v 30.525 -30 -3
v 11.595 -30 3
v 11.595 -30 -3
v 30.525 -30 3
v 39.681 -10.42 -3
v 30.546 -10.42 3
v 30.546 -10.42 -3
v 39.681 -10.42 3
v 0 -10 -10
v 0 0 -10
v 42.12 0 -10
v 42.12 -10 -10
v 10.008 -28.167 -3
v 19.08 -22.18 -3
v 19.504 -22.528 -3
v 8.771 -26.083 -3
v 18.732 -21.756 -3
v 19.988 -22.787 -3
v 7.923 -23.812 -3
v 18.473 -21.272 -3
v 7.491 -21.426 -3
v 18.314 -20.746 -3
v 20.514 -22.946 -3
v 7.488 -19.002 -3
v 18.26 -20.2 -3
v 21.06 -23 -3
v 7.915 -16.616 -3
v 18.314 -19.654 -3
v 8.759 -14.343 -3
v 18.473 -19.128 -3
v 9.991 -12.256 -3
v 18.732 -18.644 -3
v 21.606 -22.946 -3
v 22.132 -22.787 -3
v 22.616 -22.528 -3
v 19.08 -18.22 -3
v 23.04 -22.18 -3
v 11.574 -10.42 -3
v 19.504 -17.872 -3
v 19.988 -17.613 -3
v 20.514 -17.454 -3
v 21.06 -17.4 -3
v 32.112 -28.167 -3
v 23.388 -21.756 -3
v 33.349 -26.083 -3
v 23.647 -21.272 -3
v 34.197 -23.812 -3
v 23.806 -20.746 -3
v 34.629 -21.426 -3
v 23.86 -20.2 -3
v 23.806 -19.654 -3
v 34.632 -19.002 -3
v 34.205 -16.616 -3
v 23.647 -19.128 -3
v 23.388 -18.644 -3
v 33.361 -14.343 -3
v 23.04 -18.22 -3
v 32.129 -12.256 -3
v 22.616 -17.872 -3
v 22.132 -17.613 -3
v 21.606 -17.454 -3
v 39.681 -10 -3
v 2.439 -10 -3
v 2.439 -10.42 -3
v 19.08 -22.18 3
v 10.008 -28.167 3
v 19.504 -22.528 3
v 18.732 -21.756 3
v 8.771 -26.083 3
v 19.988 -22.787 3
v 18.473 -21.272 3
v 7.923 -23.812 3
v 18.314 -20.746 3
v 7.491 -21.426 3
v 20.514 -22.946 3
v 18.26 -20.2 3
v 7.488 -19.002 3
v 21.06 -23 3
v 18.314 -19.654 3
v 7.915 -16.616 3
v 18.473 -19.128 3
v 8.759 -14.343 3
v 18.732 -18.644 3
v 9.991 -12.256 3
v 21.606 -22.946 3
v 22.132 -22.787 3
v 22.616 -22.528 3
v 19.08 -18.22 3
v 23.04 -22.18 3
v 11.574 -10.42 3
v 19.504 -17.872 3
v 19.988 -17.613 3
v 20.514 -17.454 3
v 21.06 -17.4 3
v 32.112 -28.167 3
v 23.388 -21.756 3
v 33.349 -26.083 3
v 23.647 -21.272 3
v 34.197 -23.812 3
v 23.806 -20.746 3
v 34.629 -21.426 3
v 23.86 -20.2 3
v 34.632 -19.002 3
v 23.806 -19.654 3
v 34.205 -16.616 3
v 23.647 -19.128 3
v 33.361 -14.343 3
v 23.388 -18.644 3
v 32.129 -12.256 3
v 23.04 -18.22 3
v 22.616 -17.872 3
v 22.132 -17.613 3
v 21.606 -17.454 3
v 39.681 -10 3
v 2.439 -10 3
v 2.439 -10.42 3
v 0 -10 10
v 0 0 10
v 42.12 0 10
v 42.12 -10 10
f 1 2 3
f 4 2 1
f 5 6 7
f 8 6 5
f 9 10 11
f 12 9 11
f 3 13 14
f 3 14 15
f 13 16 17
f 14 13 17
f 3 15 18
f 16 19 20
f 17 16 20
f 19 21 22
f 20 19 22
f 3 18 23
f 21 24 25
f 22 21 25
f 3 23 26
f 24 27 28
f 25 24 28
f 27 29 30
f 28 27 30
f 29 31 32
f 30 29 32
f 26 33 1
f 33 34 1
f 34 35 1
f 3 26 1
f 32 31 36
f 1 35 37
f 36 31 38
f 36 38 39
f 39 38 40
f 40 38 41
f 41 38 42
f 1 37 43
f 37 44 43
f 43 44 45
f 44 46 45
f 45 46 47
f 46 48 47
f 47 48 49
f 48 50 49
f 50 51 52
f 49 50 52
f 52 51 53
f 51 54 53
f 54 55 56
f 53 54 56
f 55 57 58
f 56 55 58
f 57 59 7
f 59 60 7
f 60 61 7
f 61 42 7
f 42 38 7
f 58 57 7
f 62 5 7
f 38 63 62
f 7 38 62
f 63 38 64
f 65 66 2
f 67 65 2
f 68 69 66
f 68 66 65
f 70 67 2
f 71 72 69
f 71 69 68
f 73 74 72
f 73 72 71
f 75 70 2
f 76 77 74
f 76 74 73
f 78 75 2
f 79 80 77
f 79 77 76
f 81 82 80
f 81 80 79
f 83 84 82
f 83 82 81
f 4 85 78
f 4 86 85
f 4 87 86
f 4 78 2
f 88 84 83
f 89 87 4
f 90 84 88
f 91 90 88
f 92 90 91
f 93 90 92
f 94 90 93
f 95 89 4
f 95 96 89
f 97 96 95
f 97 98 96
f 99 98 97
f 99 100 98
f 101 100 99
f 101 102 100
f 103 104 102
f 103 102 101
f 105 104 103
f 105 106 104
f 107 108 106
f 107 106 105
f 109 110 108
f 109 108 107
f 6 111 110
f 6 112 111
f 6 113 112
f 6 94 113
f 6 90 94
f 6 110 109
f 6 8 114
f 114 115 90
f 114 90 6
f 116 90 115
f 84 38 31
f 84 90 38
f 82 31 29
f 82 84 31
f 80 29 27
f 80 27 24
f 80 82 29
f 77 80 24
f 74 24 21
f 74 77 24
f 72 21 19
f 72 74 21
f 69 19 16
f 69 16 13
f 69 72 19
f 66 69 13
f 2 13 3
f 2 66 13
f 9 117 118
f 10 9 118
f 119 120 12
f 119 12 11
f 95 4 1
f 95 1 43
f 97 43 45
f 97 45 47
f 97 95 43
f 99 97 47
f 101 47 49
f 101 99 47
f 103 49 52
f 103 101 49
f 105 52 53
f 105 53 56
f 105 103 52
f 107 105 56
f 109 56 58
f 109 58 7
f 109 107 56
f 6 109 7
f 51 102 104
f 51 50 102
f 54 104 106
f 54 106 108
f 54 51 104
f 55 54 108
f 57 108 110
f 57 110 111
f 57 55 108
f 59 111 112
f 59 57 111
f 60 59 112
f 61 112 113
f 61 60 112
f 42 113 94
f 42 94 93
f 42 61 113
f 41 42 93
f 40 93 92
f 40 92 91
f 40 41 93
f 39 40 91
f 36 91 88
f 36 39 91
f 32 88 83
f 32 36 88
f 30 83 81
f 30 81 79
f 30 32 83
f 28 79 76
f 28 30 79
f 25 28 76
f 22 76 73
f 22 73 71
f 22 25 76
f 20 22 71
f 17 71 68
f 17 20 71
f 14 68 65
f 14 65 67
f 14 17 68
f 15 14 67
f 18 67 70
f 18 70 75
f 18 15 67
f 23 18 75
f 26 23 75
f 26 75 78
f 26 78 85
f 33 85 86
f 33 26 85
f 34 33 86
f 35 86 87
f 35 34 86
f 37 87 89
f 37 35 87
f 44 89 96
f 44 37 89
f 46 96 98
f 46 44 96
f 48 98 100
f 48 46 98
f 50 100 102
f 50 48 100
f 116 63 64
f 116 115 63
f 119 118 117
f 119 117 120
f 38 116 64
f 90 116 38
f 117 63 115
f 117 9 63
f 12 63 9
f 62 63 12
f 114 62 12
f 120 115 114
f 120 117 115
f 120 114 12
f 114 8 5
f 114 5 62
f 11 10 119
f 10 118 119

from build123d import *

# Parameters (mm, degrees)
SKETCH1_W           = 42.12
SKETCH1_H           = 10
BOSS_EXTRUDE1_DEPTH = 10
SKETCH2_R           = 2.8
BOSS_EXTRUDE2_DEPTH = 3


with BuildPart() as part:
    # Sketch1 → Boss-Extrude1 (new, symmetric)
    with BuildSketch(Plane.XY):
        with Locations((21.06, -5)):
            Rectangle(SKETCH1_W, SKETCH1_H)
    extrude(amount=BOSS_EXTRUDE1_DEPTH, both=True)

    # Sketch2 → Boss-Extrude2 (add, symmetric)
    with BuildSketch(Plane.XY):
        with BuildLine():
            Line((11.595, -30), (30.525, -30))
            ThreePointArc((30.525, -30), (34.684463962, -20.214378878), (30.545664183, -10.42))
            Line((30.545664183, -10.42), (39.681383671, -10.42))
            Line((39.681383671, -10.42), (39.681383671, -10))
            Line((39.681383671, -10), (2.438616329, -10))
            Line((2.438616329, -10), (2.438616329, -10.42))
            Line((2.438616329, -10.42), (11.574335817, -10.42))
            ThreePointArc((11.574335817, -10.42), (7.435536038, -20.214378878), (11.595, -30))
        make_face()
        with Locations((21.06, -20.2)):
            Circle(SKETCH2_R, mode=Mode.SUBTRACT)
    extrude(amount=BOSS_EXTRUDE2_DEPTH, both=True)


solid = part.part
